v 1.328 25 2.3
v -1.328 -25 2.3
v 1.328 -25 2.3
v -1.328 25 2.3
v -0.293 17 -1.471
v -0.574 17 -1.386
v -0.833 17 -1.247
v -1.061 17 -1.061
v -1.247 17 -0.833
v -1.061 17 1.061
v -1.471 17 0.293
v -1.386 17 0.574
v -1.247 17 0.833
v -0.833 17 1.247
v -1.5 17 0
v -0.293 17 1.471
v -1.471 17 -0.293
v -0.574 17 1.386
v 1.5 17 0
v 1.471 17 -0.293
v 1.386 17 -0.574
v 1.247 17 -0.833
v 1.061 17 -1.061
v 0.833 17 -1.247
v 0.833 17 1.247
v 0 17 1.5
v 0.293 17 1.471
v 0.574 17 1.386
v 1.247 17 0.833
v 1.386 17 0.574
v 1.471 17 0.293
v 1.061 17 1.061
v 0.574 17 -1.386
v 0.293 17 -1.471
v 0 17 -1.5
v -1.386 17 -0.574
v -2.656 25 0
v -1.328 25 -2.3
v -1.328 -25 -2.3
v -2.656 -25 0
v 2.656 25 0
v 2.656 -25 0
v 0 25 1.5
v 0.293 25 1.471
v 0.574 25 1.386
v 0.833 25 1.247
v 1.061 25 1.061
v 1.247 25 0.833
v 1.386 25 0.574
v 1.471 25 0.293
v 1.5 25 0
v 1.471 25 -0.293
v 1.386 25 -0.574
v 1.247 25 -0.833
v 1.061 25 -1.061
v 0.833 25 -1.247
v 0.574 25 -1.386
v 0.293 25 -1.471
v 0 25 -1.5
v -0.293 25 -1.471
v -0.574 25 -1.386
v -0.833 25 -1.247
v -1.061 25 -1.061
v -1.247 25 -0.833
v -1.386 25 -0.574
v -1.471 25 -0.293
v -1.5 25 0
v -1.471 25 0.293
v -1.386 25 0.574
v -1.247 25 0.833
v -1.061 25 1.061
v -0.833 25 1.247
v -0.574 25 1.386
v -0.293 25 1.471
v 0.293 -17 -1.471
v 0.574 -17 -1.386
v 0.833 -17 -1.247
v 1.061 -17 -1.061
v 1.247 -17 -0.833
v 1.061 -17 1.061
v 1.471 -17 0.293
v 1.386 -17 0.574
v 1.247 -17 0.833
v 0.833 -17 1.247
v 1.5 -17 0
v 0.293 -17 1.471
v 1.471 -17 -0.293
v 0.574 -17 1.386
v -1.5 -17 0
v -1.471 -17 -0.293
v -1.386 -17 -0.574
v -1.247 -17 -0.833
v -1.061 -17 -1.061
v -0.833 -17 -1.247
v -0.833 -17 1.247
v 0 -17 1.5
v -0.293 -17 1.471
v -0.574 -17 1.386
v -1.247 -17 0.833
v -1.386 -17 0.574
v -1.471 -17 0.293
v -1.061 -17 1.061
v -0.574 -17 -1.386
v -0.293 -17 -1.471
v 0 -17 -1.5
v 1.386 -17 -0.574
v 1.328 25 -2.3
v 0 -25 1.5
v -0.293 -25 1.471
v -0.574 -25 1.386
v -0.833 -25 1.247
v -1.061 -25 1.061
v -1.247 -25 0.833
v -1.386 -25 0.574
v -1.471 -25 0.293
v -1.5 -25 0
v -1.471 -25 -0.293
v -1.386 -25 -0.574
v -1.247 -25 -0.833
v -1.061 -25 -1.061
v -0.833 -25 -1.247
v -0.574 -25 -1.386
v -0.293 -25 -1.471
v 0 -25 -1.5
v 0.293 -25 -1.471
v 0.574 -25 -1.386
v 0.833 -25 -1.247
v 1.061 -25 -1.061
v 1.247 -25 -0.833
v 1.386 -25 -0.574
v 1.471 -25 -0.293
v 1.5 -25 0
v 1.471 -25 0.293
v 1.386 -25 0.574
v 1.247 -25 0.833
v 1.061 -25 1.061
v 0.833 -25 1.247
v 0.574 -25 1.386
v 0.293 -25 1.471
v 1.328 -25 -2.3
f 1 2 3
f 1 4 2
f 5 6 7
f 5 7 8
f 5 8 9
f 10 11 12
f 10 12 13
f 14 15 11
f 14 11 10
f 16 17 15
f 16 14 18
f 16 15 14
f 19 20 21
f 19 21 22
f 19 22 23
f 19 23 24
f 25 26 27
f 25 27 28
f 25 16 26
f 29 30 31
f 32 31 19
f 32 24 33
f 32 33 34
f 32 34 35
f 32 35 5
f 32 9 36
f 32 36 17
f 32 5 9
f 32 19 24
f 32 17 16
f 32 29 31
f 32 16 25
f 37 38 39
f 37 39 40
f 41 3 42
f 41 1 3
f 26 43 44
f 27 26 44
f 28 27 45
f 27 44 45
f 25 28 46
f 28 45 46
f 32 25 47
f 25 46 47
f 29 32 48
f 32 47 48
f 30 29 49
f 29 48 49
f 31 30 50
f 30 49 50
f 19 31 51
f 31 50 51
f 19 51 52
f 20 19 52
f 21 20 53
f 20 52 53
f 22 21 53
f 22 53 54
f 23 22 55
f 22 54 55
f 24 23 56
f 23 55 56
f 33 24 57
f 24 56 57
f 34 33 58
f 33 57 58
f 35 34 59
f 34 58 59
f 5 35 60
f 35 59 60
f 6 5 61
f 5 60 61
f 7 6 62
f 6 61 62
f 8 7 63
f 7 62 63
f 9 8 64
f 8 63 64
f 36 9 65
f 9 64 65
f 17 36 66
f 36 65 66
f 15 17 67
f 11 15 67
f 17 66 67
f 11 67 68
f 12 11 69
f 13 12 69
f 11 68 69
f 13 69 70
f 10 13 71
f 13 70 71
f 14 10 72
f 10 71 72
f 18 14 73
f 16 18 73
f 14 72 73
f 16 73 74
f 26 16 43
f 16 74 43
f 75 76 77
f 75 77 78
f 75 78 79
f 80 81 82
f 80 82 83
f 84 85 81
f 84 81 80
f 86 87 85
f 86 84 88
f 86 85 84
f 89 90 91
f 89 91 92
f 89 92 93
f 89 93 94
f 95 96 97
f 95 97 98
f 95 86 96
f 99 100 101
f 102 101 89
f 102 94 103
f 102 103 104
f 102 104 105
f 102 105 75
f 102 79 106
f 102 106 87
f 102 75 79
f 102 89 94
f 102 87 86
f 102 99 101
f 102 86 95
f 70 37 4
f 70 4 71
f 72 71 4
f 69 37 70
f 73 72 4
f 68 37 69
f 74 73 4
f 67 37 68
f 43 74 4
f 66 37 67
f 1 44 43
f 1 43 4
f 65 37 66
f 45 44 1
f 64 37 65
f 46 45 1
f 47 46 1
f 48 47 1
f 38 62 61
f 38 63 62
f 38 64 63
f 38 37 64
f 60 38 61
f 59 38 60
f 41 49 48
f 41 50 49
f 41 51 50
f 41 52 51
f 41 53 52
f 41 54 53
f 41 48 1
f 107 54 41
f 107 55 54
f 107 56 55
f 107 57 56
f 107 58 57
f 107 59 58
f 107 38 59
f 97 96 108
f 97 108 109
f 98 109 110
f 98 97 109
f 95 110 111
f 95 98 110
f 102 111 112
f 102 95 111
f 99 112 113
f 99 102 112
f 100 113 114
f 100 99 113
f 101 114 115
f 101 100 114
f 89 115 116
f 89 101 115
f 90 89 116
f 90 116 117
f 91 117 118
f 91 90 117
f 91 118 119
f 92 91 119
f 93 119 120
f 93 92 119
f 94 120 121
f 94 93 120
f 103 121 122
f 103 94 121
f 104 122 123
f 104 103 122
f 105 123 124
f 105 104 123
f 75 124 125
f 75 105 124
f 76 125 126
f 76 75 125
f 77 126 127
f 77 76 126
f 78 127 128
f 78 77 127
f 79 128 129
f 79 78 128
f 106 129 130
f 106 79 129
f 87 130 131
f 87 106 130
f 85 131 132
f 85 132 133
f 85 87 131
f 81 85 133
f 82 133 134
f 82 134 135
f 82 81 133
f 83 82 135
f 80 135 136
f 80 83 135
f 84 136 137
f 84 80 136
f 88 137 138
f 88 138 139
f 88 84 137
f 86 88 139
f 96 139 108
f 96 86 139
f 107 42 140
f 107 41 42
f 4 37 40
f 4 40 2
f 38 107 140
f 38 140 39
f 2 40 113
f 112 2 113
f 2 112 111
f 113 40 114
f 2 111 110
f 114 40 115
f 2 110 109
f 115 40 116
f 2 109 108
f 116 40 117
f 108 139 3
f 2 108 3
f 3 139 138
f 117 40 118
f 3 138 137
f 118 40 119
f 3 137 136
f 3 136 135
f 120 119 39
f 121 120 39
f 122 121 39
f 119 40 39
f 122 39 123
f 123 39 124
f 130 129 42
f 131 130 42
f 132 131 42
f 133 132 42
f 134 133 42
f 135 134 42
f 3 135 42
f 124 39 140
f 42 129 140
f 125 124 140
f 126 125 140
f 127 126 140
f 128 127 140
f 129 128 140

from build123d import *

# Parameters (mm, degrees)
BOSS_EXTRUDE1_DEPTH = 25
SKETCH2_R           = 1.5
CUT_EXTRUDE1_DEPTH  = 8
CUT_EXTRUDE2_START  = -8
SKETCH3_R           = 1.5
CUT_EXTRUDE2_DEPTH  = 8


with BuildPart() as part:
    # Sketch1 → Boss-Extrude1 (new, symmetric)
    with BuildSketch(Plane(origin=(0, 0, 0), x_dir=(1, 0, 0), z_dir=(0, 1, 0))):
        Polygon((2.655811238, 0), (1.327905619, 2.3), (-1.327905619, 2.3), (-2.655811238, 0), (-1.327905619, -2.3), (1.327905619, -2.3), align=None)
    extrude(amount=BOSS_EXTRUDE1_DEPTH, both=True)

    # Sketch2 → Cut-Extrude1 (cut)
    with BuildSketch(Plane(origin=(0, 25, 0), x_dir=(1, 0, 0), z_dir=(0, 1, 0))):
        with Locations(Location((0, 0, 0), (0, 0, 270))):
            Circle(SKETCH2_R)
    extrude(amount=-CUT_EXTRUDE1_DEPTH, mode=Mode.SUBTRACT)

    # Sketch3 → Cut-Extrude2 (cut)
    with BuildSketch(Plane.XZ.offset(25).offset(CUT_EXTRUDE2_START)):
        with Locations(Location((0, 0, 0), (0, 0, 90))):
            Circle(SKETCH3_R)
    extrude(amount=CUT_EXTRUDE2_DEPTH, mode=Mode.SUBTRACT)


solid = part.part
